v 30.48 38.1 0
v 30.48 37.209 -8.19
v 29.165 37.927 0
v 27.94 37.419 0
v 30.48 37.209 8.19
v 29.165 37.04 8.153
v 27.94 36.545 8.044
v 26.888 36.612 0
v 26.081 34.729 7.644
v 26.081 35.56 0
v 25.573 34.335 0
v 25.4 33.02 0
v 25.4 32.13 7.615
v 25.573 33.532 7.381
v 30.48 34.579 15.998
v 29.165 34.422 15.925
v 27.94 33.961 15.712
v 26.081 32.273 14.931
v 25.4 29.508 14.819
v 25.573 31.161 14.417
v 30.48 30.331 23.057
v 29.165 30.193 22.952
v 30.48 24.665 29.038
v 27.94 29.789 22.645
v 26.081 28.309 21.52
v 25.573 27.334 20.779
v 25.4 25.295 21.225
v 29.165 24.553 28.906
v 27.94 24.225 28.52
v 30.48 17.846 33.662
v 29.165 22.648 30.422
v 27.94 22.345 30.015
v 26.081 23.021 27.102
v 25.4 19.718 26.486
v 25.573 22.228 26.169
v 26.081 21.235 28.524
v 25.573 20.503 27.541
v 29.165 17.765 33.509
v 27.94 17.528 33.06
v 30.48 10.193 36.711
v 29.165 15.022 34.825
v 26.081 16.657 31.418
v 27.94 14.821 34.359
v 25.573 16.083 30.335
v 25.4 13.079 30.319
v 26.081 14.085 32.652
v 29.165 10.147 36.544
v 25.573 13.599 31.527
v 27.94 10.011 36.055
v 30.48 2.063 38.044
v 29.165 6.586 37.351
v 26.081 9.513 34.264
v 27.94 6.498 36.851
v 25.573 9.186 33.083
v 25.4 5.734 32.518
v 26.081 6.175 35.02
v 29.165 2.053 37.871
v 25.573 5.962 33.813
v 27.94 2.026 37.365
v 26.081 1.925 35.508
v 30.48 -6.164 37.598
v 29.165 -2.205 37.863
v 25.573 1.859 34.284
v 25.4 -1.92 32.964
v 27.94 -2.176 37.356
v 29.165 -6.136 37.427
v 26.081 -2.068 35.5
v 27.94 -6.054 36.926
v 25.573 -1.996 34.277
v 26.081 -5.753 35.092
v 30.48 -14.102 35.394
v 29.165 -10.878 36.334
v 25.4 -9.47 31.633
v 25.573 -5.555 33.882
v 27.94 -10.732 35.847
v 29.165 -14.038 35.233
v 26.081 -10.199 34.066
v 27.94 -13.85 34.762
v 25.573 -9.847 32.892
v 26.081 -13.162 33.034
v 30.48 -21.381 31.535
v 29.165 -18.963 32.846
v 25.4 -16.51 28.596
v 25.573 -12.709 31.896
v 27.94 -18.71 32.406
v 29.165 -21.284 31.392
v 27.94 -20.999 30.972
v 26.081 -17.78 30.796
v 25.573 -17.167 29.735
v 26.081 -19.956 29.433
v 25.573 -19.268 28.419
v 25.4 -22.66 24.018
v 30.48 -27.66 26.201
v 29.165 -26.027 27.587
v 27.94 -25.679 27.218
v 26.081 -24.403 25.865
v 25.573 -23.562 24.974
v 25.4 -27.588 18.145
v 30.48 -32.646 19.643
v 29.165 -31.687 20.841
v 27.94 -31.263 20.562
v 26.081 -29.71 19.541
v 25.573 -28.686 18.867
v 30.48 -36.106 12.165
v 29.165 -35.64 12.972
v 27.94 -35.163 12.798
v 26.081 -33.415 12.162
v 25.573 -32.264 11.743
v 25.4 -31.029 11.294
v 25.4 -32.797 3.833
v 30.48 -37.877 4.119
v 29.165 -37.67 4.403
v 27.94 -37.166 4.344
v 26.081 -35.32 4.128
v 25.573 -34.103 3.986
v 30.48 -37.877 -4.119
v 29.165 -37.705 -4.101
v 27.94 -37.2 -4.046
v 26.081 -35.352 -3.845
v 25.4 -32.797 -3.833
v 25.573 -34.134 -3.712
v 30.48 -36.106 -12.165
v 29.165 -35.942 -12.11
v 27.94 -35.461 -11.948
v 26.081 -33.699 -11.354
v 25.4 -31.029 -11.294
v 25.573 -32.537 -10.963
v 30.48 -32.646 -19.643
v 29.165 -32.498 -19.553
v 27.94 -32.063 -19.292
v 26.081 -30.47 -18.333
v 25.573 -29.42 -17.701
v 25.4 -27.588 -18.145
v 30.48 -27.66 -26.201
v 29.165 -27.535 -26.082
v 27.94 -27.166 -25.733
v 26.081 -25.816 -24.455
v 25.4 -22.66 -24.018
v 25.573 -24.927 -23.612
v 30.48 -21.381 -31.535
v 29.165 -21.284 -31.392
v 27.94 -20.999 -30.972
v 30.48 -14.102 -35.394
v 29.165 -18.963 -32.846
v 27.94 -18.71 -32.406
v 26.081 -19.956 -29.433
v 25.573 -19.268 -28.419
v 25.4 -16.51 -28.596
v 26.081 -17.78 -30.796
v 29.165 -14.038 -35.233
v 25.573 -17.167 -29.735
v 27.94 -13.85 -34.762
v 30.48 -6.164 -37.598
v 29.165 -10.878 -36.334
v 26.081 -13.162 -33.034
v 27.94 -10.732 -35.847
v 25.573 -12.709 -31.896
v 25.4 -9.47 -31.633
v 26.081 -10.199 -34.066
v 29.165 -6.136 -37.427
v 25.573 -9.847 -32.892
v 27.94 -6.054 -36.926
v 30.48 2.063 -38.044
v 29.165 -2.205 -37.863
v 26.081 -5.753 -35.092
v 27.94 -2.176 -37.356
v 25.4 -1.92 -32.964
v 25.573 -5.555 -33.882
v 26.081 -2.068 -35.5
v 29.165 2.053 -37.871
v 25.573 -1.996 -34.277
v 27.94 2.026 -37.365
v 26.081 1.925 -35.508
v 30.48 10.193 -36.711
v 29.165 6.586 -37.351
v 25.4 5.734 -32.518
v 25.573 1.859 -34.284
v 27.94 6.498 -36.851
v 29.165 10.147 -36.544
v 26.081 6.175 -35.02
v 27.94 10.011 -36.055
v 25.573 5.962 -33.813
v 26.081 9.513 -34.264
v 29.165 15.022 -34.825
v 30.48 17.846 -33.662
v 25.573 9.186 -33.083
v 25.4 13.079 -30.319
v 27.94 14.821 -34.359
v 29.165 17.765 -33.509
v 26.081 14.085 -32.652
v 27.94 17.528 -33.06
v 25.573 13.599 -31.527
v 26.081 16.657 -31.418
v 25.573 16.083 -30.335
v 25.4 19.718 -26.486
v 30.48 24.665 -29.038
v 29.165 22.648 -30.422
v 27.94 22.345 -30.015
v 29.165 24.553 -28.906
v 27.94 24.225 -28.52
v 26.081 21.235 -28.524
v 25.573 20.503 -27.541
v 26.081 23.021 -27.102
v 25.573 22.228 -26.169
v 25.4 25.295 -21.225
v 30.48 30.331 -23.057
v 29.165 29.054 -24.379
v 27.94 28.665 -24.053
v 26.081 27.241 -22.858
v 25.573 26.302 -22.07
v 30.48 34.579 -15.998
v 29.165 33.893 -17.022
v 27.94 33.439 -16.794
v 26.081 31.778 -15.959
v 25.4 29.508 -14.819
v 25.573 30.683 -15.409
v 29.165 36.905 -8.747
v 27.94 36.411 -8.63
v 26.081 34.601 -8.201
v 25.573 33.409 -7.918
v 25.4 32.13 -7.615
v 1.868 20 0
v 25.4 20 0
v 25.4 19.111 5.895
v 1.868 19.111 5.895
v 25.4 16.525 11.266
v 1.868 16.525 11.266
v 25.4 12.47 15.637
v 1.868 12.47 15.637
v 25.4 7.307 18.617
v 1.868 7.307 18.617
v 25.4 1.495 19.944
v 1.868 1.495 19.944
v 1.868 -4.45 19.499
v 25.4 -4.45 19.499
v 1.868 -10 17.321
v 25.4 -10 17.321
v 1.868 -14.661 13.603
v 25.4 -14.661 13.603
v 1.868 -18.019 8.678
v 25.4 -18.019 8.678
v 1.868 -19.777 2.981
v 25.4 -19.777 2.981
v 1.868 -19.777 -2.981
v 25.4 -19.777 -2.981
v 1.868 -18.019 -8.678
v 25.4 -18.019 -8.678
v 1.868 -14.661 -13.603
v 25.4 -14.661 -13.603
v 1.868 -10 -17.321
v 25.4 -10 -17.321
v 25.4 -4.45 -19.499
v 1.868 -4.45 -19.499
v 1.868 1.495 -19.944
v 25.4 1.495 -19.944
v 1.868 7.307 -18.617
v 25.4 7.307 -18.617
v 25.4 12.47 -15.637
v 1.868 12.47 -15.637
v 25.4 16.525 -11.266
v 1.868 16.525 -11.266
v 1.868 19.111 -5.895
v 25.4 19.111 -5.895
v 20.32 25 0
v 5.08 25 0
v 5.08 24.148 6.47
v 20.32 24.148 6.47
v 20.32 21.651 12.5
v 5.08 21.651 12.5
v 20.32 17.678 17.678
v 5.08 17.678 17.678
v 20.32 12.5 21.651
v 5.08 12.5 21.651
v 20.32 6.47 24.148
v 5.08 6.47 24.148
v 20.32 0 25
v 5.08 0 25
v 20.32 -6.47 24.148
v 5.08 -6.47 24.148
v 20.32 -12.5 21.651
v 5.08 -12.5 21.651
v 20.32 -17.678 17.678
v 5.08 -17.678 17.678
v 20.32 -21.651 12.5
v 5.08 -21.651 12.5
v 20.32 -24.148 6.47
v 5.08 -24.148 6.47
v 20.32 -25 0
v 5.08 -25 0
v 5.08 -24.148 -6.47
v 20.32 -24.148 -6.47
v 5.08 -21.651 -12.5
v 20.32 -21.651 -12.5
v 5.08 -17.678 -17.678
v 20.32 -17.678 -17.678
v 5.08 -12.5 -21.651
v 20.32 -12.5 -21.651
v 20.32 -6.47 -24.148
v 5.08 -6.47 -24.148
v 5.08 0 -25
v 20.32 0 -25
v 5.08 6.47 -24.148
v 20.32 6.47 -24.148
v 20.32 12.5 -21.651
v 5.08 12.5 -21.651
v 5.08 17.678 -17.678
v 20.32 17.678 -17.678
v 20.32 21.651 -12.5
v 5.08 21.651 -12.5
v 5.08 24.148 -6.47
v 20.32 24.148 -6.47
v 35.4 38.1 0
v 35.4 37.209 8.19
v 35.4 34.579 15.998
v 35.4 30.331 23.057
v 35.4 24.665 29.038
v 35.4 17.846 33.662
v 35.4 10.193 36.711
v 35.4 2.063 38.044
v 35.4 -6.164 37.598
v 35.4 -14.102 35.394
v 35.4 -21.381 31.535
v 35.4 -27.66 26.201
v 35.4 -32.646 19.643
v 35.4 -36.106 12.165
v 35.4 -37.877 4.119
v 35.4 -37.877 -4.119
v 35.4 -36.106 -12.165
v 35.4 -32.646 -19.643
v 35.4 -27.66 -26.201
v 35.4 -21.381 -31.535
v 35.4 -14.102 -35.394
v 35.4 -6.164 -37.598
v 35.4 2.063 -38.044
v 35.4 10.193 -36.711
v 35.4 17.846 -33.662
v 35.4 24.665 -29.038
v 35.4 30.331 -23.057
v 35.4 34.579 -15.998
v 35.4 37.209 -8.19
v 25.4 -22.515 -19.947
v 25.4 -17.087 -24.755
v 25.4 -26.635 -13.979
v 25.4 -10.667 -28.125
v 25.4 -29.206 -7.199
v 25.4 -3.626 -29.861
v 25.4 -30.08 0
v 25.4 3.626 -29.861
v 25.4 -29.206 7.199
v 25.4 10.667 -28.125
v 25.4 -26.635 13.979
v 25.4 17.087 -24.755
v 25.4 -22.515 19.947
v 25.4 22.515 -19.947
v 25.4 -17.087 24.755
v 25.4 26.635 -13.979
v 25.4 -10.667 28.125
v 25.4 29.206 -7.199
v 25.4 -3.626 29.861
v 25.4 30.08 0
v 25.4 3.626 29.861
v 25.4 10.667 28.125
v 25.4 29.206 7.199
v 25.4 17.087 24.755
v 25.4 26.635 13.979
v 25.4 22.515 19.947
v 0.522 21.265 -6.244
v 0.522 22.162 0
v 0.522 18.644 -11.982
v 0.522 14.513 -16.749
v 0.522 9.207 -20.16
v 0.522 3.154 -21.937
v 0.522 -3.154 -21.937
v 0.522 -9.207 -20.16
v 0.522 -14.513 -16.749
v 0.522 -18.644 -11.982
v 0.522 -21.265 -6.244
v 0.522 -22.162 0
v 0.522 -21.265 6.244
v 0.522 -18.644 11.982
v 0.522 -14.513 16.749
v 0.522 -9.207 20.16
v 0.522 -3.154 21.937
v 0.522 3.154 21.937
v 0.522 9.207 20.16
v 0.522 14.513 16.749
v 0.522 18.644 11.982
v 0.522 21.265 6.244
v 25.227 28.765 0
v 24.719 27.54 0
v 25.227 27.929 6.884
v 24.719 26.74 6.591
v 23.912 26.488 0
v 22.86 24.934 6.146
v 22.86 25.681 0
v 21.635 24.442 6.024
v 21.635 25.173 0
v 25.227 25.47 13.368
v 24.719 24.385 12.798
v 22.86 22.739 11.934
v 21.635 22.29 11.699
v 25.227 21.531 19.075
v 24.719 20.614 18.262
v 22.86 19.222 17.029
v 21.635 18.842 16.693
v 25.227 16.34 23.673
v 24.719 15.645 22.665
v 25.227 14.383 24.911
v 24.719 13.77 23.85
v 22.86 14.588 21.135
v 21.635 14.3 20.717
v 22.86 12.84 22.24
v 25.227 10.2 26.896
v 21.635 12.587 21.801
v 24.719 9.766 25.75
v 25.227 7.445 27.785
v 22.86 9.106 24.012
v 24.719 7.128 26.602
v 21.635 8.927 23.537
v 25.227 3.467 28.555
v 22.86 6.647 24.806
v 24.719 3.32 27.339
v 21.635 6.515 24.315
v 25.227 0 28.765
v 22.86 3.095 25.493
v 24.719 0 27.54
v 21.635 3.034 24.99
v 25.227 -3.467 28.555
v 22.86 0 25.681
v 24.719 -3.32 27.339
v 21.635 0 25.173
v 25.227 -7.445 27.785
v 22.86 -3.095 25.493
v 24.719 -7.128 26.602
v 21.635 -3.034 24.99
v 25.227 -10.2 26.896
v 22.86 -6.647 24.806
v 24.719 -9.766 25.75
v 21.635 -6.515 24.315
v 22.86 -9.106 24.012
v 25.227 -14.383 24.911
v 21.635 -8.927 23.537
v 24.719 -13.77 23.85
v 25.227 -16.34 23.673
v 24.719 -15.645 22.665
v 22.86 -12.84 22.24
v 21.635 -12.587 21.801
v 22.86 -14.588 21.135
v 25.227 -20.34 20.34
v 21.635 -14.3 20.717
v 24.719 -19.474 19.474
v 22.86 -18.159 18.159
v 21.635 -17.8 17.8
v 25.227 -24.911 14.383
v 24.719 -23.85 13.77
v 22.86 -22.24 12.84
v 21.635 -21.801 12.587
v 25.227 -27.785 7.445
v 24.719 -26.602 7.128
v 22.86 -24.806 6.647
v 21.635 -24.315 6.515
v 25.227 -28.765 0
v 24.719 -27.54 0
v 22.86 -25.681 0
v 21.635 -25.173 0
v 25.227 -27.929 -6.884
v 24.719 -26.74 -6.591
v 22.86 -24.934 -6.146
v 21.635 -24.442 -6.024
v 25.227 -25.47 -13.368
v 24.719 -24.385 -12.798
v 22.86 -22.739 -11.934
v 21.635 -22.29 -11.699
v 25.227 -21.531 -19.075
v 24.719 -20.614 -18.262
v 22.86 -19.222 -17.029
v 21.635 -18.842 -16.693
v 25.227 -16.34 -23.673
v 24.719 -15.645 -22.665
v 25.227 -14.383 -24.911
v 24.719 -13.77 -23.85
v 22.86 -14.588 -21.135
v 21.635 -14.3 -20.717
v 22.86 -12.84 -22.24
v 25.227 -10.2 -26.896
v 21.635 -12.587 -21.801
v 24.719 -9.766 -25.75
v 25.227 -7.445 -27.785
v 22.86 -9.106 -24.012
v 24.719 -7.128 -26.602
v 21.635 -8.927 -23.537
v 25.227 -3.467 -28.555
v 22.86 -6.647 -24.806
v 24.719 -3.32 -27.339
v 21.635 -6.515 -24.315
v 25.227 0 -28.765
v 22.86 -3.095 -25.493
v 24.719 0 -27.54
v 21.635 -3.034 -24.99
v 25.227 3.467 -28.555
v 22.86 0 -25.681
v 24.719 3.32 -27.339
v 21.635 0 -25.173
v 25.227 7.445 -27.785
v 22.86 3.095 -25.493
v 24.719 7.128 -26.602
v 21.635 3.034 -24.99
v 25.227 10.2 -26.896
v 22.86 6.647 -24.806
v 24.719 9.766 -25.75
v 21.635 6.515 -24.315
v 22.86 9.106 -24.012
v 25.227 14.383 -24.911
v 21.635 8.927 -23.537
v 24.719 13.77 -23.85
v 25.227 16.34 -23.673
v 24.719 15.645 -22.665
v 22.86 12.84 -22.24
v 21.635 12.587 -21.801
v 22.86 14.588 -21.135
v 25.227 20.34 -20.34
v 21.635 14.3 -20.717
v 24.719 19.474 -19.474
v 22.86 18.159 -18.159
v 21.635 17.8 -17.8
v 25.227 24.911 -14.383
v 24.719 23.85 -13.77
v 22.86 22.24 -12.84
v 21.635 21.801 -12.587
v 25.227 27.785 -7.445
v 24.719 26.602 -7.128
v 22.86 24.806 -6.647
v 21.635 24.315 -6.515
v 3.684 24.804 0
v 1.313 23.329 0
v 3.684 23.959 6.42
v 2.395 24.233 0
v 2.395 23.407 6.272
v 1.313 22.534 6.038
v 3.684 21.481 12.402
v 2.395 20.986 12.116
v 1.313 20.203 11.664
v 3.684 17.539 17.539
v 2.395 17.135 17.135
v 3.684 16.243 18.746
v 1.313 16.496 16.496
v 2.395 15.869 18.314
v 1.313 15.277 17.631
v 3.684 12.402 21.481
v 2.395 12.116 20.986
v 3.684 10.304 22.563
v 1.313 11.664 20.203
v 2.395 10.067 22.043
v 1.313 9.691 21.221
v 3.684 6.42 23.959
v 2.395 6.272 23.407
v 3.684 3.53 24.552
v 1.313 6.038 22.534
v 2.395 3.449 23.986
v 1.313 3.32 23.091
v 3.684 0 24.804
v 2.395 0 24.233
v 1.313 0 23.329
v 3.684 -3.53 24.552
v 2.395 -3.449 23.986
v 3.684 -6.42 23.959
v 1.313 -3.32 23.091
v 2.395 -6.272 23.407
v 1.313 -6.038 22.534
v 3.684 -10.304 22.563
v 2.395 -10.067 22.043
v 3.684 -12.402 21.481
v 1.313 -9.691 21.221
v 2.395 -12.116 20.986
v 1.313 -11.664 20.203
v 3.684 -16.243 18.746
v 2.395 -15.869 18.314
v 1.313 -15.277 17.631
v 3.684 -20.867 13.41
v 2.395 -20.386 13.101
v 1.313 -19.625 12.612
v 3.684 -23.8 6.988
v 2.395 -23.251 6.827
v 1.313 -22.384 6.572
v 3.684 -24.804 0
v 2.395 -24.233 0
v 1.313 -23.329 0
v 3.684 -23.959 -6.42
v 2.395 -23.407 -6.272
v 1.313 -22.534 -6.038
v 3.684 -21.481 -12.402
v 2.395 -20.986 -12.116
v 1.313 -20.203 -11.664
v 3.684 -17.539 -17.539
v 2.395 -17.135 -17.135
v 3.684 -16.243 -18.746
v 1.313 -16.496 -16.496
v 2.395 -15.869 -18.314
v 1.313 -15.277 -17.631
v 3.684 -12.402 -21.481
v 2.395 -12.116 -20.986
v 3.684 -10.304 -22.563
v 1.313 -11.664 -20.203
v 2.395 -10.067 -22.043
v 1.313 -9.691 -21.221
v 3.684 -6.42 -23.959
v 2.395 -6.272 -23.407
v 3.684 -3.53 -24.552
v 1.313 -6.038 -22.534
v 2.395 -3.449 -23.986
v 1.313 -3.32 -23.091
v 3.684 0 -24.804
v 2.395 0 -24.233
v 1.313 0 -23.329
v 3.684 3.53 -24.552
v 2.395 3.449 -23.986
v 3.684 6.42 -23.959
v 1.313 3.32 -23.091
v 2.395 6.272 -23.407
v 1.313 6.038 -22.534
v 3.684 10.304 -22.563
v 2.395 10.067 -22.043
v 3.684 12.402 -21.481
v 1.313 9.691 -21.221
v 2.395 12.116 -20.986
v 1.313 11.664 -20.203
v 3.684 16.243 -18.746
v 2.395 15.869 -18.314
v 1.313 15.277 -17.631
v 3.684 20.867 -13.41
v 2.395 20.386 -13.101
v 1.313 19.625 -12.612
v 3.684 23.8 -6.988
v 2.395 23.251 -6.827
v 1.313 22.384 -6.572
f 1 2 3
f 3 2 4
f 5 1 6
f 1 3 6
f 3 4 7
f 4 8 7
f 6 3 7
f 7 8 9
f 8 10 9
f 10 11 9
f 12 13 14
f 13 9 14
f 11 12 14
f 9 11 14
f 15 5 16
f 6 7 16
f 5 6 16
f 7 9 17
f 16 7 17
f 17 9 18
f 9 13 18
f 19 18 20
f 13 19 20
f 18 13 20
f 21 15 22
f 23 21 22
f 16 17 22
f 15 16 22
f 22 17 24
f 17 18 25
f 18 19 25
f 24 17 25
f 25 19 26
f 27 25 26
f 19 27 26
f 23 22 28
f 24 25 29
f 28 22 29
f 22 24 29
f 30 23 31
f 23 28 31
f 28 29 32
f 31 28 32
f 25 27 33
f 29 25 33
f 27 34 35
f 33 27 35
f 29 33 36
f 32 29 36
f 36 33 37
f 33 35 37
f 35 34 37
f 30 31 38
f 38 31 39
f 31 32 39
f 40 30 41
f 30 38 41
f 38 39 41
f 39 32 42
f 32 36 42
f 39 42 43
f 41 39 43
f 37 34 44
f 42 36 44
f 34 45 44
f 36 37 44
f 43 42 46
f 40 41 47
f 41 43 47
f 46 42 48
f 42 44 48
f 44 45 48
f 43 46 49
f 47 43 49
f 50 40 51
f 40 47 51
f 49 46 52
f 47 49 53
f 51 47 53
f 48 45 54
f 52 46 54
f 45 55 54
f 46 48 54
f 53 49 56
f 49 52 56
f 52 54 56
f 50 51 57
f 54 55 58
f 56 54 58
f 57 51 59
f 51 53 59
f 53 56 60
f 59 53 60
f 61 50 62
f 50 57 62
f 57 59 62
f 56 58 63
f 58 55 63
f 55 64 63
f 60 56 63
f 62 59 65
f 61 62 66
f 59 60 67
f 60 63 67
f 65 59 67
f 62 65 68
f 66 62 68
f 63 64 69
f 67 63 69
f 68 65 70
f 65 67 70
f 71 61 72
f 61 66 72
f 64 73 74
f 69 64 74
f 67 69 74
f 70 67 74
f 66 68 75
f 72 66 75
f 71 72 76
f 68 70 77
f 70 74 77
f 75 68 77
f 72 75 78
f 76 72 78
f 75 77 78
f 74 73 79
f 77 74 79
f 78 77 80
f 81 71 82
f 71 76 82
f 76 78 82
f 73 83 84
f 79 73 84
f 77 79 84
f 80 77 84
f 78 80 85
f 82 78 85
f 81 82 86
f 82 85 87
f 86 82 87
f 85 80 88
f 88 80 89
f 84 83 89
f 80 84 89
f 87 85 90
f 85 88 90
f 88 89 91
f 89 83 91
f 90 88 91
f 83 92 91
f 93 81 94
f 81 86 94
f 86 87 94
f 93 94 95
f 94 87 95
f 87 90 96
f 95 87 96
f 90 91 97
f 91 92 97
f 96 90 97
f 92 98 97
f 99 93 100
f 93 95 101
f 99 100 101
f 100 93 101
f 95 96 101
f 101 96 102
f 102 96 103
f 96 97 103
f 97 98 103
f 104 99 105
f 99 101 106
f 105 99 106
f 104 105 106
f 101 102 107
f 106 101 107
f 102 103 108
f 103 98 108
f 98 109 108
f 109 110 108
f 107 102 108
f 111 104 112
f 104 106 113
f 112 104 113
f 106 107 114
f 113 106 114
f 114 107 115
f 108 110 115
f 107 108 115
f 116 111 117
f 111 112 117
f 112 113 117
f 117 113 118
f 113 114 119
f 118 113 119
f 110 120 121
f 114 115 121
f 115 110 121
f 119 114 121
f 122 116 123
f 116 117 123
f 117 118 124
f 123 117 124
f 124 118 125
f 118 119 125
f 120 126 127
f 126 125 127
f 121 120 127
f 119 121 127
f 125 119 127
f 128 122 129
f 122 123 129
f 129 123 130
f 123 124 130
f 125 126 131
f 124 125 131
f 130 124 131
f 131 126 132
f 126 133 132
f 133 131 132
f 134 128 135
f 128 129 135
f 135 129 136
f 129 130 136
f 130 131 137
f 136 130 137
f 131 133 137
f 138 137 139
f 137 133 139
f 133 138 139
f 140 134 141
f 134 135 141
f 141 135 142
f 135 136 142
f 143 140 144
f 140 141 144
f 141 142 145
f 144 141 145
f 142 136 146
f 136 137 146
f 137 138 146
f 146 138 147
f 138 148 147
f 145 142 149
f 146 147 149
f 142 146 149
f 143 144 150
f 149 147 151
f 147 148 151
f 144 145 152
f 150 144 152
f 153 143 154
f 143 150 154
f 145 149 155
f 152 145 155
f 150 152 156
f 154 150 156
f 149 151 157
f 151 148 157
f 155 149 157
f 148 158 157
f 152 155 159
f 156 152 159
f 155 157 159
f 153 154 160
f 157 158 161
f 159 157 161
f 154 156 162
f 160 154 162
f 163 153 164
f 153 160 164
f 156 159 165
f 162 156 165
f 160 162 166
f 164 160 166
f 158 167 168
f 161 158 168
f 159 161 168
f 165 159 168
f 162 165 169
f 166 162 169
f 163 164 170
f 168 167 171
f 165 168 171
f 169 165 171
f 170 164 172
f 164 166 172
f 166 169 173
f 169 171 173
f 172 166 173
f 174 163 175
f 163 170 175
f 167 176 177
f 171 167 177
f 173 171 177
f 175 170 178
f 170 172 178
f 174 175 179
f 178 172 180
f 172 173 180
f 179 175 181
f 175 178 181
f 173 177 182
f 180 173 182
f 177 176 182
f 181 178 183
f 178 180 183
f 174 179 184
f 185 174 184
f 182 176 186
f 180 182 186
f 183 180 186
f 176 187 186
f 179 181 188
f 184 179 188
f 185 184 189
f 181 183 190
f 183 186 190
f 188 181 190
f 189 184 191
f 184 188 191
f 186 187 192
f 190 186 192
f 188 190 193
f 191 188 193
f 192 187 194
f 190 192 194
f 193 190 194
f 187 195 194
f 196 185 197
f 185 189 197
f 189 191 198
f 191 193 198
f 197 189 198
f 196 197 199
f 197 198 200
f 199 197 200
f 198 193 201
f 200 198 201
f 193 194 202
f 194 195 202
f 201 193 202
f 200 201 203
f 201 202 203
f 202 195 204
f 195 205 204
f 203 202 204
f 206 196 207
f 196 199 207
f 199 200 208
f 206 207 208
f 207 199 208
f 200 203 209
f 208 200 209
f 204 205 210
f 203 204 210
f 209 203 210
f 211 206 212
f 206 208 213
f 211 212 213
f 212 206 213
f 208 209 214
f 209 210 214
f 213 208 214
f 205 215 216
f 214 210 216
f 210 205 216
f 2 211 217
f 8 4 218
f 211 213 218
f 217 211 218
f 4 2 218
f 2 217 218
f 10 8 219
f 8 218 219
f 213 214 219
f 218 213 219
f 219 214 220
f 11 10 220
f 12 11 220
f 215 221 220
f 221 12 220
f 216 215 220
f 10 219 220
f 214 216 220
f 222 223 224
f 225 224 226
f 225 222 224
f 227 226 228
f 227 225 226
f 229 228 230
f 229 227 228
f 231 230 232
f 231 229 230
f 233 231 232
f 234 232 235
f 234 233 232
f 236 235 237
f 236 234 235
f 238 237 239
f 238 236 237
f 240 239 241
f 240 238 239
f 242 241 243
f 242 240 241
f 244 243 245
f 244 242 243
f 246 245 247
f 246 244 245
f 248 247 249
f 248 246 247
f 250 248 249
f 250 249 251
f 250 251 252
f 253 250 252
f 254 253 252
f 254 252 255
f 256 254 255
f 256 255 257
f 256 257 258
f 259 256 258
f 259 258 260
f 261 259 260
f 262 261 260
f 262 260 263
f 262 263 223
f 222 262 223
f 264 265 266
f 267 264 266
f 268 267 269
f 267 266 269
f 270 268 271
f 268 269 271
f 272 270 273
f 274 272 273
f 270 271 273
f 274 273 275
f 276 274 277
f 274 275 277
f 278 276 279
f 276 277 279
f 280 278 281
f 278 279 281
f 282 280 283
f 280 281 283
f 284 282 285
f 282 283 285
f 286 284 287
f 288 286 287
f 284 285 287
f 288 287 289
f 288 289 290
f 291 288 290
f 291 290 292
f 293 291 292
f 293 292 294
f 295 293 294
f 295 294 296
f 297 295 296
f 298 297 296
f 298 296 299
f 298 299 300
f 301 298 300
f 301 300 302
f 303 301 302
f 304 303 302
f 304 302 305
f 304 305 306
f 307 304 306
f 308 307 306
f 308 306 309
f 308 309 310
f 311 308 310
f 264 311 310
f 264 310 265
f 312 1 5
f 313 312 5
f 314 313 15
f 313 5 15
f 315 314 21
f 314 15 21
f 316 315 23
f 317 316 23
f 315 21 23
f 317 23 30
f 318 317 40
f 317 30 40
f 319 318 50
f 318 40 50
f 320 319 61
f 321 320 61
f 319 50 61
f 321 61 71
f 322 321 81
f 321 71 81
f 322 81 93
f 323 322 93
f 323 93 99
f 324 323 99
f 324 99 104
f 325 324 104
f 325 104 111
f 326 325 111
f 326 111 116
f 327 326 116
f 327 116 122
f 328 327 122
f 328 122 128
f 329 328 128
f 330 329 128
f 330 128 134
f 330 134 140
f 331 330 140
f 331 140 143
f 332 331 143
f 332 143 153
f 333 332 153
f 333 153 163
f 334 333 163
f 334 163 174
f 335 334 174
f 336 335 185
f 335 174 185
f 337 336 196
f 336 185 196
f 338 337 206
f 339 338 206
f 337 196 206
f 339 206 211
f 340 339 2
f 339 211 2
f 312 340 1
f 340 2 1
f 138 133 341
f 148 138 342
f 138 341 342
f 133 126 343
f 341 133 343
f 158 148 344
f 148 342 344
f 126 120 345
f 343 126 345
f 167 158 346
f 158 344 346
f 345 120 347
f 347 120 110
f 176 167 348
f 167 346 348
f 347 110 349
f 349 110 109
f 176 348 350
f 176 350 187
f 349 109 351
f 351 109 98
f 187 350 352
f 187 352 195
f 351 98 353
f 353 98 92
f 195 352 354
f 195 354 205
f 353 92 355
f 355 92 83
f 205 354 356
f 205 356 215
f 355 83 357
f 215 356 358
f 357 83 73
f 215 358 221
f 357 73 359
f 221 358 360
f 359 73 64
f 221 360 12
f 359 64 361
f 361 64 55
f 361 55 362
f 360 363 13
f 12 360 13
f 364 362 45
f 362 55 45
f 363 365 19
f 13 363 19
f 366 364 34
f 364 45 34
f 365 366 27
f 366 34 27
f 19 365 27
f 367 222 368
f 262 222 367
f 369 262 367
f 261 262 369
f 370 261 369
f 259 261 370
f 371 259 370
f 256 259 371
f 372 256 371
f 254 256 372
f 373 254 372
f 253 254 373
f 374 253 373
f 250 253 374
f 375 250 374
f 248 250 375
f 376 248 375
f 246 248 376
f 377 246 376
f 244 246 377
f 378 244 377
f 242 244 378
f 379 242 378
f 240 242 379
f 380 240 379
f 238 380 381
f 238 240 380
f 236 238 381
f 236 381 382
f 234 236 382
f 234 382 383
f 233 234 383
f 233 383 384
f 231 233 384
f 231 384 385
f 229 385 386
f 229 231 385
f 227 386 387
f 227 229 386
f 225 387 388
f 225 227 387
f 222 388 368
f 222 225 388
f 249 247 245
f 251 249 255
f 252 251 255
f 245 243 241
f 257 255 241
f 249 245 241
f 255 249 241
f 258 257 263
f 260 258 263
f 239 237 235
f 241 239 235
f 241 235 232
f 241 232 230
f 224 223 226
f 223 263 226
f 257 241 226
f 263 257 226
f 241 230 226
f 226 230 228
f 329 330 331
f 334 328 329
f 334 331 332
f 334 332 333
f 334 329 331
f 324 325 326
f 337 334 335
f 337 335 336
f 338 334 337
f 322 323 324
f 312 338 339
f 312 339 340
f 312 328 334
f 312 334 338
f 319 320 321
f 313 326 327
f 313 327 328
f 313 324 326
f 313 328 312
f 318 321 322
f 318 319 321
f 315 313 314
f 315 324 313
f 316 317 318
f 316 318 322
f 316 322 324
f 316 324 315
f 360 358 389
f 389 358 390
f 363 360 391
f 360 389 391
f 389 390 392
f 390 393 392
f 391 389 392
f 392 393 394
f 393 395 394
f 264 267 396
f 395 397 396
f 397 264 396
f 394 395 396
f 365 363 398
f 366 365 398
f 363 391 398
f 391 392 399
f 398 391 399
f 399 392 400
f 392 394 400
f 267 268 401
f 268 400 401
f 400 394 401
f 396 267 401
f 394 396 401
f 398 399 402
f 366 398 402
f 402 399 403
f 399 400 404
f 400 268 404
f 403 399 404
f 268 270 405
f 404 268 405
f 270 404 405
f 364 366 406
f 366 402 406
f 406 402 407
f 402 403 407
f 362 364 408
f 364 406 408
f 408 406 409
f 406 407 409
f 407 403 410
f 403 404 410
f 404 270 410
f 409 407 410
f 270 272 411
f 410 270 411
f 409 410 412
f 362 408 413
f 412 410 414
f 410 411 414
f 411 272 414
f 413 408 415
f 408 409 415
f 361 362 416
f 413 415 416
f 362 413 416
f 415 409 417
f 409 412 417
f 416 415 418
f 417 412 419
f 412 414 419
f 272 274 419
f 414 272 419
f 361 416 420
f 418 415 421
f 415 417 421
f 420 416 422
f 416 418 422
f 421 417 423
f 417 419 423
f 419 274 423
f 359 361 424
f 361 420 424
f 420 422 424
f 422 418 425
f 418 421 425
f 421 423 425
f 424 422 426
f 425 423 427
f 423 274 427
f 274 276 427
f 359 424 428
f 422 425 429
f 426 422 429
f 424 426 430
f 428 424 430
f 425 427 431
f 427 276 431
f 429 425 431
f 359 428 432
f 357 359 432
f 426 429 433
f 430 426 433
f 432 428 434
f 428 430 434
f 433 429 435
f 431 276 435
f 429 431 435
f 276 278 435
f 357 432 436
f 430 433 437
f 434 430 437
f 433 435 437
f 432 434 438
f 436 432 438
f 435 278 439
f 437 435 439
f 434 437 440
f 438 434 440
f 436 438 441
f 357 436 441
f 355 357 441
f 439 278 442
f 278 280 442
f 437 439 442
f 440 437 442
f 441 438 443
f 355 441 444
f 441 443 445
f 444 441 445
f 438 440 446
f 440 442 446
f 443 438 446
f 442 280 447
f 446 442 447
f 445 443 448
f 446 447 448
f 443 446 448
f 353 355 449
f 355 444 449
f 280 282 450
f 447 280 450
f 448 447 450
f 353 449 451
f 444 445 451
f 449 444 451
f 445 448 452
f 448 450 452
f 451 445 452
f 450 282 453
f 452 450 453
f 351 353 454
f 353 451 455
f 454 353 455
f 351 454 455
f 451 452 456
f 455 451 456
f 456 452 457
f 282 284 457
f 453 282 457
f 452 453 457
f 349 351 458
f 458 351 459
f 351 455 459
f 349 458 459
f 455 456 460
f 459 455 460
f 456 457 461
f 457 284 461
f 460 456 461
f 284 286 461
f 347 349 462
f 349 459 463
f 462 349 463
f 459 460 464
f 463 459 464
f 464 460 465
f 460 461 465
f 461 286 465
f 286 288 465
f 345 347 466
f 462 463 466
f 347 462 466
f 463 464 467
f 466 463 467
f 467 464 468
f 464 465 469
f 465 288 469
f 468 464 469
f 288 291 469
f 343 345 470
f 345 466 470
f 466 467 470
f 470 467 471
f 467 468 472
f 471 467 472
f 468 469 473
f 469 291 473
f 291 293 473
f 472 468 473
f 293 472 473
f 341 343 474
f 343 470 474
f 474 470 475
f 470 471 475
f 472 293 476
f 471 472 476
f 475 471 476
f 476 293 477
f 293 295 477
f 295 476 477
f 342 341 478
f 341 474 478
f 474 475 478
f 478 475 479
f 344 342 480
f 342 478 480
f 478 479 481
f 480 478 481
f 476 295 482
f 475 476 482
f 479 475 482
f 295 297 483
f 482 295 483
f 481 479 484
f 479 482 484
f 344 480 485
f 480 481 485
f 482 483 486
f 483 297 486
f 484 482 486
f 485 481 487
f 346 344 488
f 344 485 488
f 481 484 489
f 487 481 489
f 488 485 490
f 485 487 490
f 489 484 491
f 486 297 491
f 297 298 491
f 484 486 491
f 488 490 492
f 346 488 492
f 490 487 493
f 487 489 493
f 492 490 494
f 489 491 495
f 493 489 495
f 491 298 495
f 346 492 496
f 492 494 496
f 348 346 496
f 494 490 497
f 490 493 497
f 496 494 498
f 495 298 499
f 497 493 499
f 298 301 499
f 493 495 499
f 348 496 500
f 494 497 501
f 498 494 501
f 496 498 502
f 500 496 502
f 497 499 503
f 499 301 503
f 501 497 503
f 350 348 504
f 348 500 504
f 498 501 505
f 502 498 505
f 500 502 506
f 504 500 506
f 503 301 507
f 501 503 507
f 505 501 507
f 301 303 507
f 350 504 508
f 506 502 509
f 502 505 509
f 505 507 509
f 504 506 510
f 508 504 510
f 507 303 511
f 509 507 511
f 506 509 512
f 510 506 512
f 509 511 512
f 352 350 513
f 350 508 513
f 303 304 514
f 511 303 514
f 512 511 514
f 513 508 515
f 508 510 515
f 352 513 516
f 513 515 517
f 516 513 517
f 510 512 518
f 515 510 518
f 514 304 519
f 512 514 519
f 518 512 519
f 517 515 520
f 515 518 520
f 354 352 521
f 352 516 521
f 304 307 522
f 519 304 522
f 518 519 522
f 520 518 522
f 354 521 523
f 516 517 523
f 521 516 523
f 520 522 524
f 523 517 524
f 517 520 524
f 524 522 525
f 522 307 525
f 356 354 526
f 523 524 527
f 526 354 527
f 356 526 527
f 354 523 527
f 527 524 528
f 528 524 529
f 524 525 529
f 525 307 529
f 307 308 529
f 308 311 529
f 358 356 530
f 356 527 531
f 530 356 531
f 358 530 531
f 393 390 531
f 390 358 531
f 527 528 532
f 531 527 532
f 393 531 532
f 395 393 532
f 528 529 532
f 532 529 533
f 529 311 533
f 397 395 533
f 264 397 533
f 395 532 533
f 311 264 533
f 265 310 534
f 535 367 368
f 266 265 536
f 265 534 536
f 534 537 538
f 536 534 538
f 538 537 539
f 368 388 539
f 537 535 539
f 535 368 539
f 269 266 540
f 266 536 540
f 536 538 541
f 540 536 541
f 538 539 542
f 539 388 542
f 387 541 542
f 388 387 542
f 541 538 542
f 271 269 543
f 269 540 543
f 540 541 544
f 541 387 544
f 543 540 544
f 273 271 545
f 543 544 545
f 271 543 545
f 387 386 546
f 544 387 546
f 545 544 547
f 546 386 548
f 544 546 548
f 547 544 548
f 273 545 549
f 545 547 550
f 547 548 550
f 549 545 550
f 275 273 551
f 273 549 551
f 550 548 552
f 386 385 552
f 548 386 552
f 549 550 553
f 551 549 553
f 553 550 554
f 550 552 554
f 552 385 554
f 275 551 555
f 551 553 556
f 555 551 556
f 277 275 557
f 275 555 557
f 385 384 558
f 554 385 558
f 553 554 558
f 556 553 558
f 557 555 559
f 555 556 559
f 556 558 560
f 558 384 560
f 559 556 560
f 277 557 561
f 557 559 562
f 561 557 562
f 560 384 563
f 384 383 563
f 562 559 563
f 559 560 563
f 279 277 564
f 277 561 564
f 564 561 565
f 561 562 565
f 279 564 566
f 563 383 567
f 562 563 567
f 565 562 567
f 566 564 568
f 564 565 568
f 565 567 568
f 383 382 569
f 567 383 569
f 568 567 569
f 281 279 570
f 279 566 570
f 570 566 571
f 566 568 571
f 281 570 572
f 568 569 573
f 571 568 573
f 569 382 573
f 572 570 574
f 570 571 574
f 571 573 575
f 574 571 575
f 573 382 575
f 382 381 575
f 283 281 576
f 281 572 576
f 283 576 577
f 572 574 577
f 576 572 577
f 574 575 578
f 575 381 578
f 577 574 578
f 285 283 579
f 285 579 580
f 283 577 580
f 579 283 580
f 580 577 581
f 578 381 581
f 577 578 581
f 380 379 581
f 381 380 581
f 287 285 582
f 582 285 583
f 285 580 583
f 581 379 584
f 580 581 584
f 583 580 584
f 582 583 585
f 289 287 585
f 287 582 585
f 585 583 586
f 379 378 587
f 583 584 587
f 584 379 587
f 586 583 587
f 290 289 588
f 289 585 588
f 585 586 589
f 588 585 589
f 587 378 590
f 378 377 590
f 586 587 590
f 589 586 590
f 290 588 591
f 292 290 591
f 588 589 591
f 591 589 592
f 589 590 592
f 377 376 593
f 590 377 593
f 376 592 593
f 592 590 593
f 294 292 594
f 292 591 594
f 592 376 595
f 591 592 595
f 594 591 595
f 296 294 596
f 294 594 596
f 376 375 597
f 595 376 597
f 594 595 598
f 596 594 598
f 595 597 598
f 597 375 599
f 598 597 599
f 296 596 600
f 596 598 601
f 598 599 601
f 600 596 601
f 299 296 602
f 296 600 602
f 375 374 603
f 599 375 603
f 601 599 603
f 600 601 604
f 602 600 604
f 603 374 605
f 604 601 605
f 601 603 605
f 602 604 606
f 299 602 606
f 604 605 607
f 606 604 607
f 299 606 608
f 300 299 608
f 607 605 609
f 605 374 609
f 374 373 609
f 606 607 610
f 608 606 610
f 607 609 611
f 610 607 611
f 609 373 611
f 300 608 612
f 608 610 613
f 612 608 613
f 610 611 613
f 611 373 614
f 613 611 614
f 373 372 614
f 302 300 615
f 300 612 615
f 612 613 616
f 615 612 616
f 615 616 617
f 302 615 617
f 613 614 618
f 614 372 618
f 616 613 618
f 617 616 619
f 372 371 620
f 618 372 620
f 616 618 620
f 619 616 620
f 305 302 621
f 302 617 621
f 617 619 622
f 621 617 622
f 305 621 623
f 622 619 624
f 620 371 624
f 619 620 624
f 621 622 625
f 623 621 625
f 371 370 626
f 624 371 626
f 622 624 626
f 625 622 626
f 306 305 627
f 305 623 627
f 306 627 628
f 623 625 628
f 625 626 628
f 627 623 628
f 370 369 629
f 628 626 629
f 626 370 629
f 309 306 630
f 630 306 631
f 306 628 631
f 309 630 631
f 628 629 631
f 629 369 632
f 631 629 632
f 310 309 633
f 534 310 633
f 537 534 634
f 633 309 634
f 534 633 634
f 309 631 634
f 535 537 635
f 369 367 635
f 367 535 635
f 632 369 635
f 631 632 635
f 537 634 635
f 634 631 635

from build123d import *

# Parameters (mm, degrees)
F0_R     = 25
F0_R_2   = 20
F1_DEPTH = 25.4
F2_R     = 38.1
F2_R_2   = 25
F2_R_3   = 20
F3_DEPTH = 10


# Not quite as in the source:
# - a fillet or chamfer that OpenCascade refuses, or shapes differently, is made with other operations: its cross-section is extruded or revolved along the edge and cut away or added


with BuildPart() as f1:
    # F0 (on Right) → F1 (new body)
    with BuildSketch(Plane.YZ):
        Circle(F0_R)
        Circle(F0_R_2, mode=Mode.SUBTRACT)
    extrude(amount=F1_DEPTH)

    # F2 (on face) → F3 (join)
    with BuildSketch(Plane.YZ.offset(25.4)):
        Circle(F2_R)
        Circle(F2_R_2, mode=Mode.SUBTRACT)
        Circle(F2_R_2)
        Circle(F2_R_3, mode=Mode.SUBTRACT)
        Circle(F2_R_3)
    extrude(amount=F3_DEPTH)

    # F4: fillet of radius 5.08 on 4 edges, made by hand

    # F4_s1 → F4_t2 (revolve)
    with BuildSketch(Plane.XY):
        with BuildLine():
            ThreePointArc((25.4, 30.08), (23.9121024484, 26.4878975516), (20.32, 25))
            Line((20.32, 25), (25.4, 25))
            Line((25.4, 25), (25.4, 30.08))
        make_face()
    revolve(axis=Axis((25.4, 0, 0), (1, 0, 0)))

    # F4_s3 → F4_t4 (revolve, cut)
    with BuildSketch(Plane.XY):
        with BuildLine():
            ThreePointArc((5.08, 25), (1.4878975516, 23.5121024484), (0, 19.92))
            Line((0, 19.92), (0, 25))
            Line((0, 25), (5.08, 25))
        make_face()
    revolve(axis=Axis((0, 0, 0), (1, 0, 0)), mode=Mode.SUBTRACT)

    # F4_s5 → F4_t6 (revolve, cut)
    with BuildSketch(Plane.XY):
        with BuildLine():
            ThreePointArc((30.48, 38.1), (26.8878975516, 36.6121024484), (25.4, 33.02))
            Line((25.4, 33.02), (25.4, 38.1))
            Line((25.4, 38.1), (30.48, 38.1))
        make_face()
    revolve(axis=Axis((25.4, 0, 0), (1, 0, 0)), mode=Mode.SUBTRACT)

    # F5: chamfer of 1.524 on 1 edges, made by hand

    # F5_s1 → F5_t2 (revolve, cut)
    with BuildSketch(Plane.XY):
        with BuildLine():
            Line((0.4894859208, 22.2141433772), (1.9000393506, 19.9482483046))
            Line((1.9000393506, 19.9482483046), (1.9000393506, 19.9177683046))
            ThreePointArc((1.9000393506, 19.9177683046), (0.9503346555, 19.96952), (0.0006299603, 19.96952))
            Line((0.0006299603, 19.96952), (-0.0298462599, 20.00048))
            ThreePointArc((-0.0298462599, 20.00048), (0.1169178679, 21.1385325522), (0.4621361335, 22.2275977273))
            Line((0.4621361335, 22.2275977273), (0.4894859208, 22.2141433772))
        make_face()
    revolve(axis=Axis((0.0006299603, 0, 0), (-1, 0, 0)), mode=Mode.SUBTRACT)


solid = f1.part
